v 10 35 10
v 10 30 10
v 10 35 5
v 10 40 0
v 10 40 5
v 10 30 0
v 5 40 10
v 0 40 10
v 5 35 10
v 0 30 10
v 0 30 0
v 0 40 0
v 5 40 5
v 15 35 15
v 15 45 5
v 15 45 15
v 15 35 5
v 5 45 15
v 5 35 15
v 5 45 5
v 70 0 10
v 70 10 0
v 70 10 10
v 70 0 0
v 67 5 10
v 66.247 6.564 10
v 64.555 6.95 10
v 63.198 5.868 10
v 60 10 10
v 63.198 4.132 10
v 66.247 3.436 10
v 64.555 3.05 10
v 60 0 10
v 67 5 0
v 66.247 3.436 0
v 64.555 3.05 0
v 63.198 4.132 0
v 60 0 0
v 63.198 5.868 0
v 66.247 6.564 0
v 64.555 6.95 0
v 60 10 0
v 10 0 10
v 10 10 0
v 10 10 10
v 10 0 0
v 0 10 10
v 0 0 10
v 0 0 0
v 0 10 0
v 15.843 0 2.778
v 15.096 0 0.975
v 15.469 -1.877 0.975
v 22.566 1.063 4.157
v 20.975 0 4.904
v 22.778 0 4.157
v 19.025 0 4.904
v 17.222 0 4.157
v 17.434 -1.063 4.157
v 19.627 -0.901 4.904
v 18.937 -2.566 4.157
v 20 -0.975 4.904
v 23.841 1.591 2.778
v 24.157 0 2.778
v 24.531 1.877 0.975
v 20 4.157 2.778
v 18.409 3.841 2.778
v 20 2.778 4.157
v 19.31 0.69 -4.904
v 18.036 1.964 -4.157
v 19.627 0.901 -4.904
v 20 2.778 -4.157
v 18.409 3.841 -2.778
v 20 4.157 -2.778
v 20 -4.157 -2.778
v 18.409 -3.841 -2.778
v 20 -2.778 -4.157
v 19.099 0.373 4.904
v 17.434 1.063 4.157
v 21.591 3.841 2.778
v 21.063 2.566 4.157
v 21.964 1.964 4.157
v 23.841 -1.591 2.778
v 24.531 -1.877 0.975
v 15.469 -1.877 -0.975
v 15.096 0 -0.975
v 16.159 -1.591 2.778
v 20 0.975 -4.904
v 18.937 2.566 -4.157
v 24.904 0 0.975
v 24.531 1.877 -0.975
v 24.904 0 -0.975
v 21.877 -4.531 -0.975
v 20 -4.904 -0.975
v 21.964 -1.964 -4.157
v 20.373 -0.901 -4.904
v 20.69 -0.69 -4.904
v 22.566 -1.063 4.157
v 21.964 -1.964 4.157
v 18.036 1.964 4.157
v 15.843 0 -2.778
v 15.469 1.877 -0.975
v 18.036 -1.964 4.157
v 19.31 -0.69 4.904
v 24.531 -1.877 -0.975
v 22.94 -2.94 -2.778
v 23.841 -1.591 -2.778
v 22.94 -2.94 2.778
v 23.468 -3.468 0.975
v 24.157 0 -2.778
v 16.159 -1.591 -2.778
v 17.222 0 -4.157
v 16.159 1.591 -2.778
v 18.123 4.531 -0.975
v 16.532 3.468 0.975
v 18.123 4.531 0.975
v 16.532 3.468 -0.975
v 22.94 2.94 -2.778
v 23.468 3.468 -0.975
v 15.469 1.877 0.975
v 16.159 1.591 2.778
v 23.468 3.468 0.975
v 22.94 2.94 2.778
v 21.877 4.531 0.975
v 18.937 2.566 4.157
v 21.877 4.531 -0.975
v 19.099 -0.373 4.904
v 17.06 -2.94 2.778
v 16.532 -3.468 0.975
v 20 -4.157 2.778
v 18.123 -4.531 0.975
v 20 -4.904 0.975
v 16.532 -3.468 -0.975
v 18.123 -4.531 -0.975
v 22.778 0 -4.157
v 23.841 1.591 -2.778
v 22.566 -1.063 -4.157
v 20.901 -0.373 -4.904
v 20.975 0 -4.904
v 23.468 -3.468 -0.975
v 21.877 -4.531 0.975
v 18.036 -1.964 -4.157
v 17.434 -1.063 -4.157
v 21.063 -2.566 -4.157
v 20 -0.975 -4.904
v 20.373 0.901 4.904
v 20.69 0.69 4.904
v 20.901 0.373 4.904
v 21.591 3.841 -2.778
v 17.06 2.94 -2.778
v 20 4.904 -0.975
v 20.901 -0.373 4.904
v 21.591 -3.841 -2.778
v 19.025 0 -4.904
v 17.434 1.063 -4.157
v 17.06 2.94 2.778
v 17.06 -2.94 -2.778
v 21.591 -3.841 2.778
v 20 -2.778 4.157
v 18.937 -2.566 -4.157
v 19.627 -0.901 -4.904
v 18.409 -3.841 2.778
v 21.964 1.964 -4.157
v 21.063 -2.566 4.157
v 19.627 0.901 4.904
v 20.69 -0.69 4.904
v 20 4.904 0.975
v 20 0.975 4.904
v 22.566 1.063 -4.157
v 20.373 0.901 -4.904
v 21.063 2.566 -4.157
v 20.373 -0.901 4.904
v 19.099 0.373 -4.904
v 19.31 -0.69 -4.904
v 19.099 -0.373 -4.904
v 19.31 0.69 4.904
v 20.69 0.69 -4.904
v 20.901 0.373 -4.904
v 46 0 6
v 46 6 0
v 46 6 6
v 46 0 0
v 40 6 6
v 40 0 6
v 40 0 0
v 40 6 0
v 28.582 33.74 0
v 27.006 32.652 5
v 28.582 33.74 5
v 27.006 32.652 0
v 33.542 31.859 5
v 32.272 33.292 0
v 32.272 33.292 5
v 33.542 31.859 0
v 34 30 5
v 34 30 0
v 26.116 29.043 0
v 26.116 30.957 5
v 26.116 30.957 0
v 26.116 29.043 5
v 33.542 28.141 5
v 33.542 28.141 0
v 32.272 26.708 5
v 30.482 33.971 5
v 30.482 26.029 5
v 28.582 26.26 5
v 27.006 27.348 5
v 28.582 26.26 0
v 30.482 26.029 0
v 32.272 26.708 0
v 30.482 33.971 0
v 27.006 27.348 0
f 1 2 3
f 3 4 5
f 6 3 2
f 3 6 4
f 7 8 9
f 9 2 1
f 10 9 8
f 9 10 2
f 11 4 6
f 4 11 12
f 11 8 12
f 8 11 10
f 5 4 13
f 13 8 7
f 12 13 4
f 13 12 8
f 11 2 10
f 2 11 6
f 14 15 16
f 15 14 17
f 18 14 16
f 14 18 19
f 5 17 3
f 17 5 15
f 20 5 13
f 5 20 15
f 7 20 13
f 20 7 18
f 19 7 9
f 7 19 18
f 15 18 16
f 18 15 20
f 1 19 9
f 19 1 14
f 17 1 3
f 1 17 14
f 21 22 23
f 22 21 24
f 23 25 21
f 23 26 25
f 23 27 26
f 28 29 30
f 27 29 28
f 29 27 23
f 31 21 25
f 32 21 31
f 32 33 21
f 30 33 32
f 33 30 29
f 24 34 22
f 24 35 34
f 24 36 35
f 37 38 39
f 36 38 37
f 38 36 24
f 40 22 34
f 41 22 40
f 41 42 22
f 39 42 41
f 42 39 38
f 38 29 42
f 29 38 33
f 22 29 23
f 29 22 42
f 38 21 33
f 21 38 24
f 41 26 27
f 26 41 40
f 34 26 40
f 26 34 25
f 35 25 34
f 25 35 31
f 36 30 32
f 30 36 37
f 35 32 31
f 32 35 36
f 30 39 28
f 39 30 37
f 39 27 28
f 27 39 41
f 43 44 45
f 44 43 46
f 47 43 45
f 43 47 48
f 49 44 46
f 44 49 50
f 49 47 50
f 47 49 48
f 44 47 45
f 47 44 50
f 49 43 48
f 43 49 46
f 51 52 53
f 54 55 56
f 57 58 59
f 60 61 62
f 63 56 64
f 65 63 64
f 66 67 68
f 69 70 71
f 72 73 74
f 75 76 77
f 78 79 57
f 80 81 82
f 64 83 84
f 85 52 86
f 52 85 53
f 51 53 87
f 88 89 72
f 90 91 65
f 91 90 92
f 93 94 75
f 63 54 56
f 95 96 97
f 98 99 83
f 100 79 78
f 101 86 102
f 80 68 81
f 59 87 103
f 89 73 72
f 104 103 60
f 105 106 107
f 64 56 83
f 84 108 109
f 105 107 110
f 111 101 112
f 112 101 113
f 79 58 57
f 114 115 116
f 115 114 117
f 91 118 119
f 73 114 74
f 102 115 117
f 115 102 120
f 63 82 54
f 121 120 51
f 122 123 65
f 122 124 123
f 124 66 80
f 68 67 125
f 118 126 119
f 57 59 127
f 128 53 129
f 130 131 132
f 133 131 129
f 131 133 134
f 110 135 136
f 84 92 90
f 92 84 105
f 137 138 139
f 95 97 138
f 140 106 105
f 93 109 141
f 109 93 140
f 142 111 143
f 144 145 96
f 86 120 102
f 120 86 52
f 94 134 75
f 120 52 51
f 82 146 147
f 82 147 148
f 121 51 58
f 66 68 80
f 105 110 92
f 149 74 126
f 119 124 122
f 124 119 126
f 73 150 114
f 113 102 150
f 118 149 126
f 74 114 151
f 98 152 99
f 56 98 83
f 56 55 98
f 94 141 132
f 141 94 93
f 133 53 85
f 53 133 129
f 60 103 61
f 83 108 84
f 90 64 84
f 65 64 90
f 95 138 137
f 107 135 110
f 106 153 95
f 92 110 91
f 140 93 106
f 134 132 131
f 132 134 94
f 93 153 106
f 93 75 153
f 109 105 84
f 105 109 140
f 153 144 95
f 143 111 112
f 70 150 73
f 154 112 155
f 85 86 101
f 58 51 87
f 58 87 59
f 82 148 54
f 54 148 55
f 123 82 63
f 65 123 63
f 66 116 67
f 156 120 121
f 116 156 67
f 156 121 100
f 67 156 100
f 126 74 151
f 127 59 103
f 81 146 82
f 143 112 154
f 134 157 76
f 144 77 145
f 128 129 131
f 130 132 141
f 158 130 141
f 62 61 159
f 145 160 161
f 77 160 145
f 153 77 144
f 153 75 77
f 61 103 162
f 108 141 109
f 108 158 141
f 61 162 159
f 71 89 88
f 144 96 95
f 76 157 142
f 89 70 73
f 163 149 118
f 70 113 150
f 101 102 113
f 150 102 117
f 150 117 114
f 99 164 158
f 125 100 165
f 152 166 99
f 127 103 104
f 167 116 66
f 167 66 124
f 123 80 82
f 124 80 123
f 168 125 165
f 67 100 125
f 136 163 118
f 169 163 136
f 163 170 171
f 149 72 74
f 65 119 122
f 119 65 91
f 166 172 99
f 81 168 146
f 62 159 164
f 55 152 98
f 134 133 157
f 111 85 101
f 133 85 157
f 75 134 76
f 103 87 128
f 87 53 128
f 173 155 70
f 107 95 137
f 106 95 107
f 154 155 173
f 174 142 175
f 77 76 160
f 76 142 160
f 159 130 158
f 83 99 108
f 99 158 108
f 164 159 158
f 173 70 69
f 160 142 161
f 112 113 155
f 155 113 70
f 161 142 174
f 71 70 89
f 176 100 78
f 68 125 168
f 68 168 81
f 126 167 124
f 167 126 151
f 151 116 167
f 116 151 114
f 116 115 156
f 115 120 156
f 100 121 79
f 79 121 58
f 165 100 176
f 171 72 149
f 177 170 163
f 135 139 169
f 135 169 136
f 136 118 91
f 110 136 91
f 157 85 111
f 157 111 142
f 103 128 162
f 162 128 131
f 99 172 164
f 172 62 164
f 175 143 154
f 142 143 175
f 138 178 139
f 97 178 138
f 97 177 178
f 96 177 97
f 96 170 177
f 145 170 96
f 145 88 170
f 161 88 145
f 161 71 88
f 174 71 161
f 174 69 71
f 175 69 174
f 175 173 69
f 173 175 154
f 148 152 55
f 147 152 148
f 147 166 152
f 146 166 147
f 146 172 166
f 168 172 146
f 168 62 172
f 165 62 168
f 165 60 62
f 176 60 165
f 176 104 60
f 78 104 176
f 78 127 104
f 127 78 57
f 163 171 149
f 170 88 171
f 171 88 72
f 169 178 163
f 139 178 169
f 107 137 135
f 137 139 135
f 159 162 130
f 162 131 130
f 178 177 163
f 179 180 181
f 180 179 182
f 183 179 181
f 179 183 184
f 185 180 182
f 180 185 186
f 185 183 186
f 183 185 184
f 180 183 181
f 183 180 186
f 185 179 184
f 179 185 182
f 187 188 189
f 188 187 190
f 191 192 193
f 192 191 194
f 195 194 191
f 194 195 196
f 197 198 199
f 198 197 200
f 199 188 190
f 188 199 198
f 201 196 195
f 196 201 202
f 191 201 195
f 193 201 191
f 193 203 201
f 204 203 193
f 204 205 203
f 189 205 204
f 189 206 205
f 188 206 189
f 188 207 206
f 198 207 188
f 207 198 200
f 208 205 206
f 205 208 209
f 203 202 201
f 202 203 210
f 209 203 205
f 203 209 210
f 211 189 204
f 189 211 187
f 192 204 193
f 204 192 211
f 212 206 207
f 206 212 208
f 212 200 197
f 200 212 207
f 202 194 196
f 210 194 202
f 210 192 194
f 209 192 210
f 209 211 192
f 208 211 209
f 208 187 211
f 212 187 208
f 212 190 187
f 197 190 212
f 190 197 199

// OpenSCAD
color("red") cube(10);
translate([20, 0, 0]) color("blue") sphere(5);
translate([40, 0, 0]) cube(6);
// overlapping: later blue claims the shared material
translate([0, 30, 0]) union() { color("red") cube(10); color("blue") translate([5, 5, 5]) cube(10); }
// preview rule: outer color wins
translate([30, 30, 0]) color("green") color("yellow") cylinder(h = 5, r = 4);
// difference keeps the minuend's color
translate([60, 0, 0]) difference() { color("red") cube(10); color("blue") translate([5, 5, -1]) cylinder(h = 12, r = 2); }
